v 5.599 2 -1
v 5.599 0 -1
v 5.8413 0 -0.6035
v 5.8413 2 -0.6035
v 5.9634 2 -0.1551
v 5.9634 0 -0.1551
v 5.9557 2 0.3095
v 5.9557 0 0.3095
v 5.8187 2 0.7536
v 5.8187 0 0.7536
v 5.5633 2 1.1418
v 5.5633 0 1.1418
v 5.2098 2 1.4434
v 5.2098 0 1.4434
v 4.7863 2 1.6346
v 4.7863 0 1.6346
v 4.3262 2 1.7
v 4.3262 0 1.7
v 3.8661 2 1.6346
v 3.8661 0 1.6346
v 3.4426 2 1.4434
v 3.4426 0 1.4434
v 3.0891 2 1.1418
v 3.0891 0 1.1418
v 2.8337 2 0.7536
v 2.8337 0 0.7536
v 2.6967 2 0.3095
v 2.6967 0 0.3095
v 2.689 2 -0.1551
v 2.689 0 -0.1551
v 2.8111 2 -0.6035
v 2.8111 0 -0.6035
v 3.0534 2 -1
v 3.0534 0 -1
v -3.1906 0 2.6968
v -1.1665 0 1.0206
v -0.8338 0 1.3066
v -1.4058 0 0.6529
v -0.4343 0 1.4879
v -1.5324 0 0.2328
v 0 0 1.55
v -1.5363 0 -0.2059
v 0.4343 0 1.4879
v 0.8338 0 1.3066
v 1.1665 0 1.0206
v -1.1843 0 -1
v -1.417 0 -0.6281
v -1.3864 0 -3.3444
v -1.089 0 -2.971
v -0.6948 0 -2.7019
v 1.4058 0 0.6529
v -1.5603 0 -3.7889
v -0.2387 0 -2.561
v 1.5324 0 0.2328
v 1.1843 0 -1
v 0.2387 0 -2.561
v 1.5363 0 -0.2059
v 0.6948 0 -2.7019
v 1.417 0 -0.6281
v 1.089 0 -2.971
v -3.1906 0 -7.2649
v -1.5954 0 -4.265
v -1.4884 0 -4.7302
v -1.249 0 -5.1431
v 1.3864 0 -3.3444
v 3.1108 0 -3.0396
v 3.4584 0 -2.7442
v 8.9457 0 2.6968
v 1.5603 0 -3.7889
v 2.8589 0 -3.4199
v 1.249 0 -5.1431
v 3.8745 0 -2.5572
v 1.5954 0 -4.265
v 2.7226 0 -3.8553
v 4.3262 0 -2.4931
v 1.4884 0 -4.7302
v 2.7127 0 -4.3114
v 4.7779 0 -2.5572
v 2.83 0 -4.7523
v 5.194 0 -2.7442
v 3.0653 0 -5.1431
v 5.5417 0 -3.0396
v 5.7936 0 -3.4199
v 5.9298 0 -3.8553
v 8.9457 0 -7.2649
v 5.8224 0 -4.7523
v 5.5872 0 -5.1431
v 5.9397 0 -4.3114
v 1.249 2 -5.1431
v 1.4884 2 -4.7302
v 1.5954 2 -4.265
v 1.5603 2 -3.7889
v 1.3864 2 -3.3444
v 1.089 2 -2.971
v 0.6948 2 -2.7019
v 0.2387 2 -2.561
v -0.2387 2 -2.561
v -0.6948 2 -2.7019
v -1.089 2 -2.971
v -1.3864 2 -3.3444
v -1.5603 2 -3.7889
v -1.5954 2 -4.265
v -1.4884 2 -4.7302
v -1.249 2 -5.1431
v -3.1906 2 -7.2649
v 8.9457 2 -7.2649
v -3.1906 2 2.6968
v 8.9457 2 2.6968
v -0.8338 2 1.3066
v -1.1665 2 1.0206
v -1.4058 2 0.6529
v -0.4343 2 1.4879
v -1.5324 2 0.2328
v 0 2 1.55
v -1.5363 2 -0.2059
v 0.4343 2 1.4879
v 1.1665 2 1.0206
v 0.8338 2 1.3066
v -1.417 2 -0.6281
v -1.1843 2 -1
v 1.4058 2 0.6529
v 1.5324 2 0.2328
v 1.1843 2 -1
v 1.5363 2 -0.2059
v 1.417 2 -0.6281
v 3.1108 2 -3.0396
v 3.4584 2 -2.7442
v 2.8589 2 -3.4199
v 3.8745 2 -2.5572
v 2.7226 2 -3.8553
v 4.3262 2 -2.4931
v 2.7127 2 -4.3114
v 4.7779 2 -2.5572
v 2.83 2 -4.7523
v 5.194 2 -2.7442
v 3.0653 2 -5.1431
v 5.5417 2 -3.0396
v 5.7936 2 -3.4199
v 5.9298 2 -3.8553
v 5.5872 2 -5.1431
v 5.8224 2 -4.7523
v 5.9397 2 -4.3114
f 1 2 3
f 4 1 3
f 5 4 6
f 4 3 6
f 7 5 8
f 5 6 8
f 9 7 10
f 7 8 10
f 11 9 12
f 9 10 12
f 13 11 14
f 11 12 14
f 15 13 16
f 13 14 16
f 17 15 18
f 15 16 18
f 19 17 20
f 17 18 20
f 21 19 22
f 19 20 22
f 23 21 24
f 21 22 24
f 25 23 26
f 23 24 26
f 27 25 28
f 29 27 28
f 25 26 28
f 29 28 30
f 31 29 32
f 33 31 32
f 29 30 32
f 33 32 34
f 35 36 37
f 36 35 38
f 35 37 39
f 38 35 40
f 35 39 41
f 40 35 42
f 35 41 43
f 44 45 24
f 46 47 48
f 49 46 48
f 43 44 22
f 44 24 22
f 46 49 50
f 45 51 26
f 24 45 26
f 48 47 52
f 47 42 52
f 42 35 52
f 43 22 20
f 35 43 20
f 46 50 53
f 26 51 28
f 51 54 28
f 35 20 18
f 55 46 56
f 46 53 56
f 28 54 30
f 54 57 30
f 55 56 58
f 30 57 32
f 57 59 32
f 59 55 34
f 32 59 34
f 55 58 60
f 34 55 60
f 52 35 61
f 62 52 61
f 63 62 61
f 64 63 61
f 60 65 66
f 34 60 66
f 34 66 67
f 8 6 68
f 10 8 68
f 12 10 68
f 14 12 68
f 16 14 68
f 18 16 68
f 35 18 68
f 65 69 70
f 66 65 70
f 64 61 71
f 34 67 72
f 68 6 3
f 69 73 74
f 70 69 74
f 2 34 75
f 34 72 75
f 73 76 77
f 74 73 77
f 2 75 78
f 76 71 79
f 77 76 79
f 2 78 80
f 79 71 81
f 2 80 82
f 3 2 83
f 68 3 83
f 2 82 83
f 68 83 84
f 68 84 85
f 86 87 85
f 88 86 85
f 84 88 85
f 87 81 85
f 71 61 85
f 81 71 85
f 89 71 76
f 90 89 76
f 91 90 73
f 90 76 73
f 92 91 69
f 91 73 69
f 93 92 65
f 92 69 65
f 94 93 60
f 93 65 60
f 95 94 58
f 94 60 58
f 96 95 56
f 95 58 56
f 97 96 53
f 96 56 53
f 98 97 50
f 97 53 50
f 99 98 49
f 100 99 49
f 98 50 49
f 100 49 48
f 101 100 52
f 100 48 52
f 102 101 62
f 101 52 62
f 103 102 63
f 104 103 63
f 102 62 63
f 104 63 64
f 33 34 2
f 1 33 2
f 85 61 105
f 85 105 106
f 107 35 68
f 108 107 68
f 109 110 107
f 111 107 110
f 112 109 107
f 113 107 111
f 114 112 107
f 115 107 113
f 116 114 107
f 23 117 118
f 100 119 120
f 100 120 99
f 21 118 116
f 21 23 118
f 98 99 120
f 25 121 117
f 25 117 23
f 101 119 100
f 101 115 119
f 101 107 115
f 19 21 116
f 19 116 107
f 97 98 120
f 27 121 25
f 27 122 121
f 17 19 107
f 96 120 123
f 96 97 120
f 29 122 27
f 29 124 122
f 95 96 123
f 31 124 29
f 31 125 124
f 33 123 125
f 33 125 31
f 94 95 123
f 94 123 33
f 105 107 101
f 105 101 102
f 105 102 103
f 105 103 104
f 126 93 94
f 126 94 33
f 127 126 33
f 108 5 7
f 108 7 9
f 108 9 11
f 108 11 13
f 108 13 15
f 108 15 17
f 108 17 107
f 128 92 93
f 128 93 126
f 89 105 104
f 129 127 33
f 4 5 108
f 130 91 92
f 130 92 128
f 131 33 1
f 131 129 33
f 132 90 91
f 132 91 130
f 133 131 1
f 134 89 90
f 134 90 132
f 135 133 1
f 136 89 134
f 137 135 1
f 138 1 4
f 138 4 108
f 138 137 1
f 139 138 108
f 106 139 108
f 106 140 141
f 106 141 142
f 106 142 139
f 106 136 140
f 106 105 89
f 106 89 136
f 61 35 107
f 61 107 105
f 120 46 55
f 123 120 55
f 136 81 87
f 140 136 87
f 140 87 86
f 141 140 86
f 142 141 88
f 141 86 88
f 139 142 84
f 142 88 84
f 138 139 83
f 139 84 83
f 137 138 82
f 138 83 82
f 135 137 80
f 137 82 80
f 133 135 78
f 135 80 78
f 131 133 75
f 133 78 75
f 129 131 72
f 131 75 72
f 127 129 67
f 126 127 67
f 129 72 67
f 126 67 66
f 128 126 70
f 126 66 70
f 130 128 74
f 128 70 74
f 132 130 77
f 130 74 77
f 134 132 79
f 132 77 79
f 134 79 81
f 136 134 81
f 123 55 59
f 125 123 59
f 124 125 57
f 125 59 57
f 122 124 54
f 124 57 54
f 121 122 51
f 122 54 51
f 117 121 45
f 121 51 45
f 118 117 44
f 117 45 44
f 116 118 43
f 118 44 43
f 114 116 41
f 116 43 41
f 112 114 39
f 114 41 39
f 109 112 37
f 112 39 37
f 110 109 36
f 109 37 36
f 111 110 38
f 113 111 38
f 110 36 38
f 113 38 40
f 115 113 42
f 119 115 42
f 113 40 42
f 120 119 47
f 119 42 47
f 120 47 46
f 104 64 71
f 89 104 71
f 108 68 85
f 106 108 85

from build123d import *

# Parameters (mm, degrees)
SKETCH1_W           = 12.136372274
SKETCH1_H           = 9.961646607
BOSS_EXTRUDE2_DEPTH = 2


with BuildPart() as part:
    # Sketch1 → Boss-Extrude2 (new body)
    with BuildSketch(Plane(origin=(0, 0, 0), x_dir=(1, 0, 0), z_dir=(0, 1, 0))):
        with Locations((2.877549337, 2.284027555)):
            Rectangle(SKETCH1_W, SKETCH1_H)
        with BuildLine():
            Line((-1.184271928, 1), (1.184271928, 1))
            ThreePointArc((1.184271928, 1), (0, -1.55), (-1.184271928, 1))
        make_face(mode=Mode.SUBTRACT)
        with BuildLine():
            Line((3.05341377, 1), (5.598998182, 1))
            ThreePointArc((5.598998182, 1), (4.326205976, -1.7), (3.05341377, 1))
        make_face(mode=Mode.SUBTRACT)
        with BuildLine():
            Line((-1.2489996, 5.143134086), (1.2489996, 5.143134086))
            ThreePointArc((1.2489996, 5.143134086), (0, 2.543134086), (-1.2489996, 5.143134086))
        make_face(mode=Mode.SUBTRACT)
        with BuildLine():
            Line((3.065253955, 5.143134086), (5.587157997, 5.143134086))
            ThreePointArc((5.587157997, 5.143134086), (4.326205976, 2.493134086), (3.065253955, 5.143134086))
        make_face(mode=Mode.SUBTRACT)
    extrude(amount=BOSS_EXTRUDE2_DEPTH)


solid = part.part
